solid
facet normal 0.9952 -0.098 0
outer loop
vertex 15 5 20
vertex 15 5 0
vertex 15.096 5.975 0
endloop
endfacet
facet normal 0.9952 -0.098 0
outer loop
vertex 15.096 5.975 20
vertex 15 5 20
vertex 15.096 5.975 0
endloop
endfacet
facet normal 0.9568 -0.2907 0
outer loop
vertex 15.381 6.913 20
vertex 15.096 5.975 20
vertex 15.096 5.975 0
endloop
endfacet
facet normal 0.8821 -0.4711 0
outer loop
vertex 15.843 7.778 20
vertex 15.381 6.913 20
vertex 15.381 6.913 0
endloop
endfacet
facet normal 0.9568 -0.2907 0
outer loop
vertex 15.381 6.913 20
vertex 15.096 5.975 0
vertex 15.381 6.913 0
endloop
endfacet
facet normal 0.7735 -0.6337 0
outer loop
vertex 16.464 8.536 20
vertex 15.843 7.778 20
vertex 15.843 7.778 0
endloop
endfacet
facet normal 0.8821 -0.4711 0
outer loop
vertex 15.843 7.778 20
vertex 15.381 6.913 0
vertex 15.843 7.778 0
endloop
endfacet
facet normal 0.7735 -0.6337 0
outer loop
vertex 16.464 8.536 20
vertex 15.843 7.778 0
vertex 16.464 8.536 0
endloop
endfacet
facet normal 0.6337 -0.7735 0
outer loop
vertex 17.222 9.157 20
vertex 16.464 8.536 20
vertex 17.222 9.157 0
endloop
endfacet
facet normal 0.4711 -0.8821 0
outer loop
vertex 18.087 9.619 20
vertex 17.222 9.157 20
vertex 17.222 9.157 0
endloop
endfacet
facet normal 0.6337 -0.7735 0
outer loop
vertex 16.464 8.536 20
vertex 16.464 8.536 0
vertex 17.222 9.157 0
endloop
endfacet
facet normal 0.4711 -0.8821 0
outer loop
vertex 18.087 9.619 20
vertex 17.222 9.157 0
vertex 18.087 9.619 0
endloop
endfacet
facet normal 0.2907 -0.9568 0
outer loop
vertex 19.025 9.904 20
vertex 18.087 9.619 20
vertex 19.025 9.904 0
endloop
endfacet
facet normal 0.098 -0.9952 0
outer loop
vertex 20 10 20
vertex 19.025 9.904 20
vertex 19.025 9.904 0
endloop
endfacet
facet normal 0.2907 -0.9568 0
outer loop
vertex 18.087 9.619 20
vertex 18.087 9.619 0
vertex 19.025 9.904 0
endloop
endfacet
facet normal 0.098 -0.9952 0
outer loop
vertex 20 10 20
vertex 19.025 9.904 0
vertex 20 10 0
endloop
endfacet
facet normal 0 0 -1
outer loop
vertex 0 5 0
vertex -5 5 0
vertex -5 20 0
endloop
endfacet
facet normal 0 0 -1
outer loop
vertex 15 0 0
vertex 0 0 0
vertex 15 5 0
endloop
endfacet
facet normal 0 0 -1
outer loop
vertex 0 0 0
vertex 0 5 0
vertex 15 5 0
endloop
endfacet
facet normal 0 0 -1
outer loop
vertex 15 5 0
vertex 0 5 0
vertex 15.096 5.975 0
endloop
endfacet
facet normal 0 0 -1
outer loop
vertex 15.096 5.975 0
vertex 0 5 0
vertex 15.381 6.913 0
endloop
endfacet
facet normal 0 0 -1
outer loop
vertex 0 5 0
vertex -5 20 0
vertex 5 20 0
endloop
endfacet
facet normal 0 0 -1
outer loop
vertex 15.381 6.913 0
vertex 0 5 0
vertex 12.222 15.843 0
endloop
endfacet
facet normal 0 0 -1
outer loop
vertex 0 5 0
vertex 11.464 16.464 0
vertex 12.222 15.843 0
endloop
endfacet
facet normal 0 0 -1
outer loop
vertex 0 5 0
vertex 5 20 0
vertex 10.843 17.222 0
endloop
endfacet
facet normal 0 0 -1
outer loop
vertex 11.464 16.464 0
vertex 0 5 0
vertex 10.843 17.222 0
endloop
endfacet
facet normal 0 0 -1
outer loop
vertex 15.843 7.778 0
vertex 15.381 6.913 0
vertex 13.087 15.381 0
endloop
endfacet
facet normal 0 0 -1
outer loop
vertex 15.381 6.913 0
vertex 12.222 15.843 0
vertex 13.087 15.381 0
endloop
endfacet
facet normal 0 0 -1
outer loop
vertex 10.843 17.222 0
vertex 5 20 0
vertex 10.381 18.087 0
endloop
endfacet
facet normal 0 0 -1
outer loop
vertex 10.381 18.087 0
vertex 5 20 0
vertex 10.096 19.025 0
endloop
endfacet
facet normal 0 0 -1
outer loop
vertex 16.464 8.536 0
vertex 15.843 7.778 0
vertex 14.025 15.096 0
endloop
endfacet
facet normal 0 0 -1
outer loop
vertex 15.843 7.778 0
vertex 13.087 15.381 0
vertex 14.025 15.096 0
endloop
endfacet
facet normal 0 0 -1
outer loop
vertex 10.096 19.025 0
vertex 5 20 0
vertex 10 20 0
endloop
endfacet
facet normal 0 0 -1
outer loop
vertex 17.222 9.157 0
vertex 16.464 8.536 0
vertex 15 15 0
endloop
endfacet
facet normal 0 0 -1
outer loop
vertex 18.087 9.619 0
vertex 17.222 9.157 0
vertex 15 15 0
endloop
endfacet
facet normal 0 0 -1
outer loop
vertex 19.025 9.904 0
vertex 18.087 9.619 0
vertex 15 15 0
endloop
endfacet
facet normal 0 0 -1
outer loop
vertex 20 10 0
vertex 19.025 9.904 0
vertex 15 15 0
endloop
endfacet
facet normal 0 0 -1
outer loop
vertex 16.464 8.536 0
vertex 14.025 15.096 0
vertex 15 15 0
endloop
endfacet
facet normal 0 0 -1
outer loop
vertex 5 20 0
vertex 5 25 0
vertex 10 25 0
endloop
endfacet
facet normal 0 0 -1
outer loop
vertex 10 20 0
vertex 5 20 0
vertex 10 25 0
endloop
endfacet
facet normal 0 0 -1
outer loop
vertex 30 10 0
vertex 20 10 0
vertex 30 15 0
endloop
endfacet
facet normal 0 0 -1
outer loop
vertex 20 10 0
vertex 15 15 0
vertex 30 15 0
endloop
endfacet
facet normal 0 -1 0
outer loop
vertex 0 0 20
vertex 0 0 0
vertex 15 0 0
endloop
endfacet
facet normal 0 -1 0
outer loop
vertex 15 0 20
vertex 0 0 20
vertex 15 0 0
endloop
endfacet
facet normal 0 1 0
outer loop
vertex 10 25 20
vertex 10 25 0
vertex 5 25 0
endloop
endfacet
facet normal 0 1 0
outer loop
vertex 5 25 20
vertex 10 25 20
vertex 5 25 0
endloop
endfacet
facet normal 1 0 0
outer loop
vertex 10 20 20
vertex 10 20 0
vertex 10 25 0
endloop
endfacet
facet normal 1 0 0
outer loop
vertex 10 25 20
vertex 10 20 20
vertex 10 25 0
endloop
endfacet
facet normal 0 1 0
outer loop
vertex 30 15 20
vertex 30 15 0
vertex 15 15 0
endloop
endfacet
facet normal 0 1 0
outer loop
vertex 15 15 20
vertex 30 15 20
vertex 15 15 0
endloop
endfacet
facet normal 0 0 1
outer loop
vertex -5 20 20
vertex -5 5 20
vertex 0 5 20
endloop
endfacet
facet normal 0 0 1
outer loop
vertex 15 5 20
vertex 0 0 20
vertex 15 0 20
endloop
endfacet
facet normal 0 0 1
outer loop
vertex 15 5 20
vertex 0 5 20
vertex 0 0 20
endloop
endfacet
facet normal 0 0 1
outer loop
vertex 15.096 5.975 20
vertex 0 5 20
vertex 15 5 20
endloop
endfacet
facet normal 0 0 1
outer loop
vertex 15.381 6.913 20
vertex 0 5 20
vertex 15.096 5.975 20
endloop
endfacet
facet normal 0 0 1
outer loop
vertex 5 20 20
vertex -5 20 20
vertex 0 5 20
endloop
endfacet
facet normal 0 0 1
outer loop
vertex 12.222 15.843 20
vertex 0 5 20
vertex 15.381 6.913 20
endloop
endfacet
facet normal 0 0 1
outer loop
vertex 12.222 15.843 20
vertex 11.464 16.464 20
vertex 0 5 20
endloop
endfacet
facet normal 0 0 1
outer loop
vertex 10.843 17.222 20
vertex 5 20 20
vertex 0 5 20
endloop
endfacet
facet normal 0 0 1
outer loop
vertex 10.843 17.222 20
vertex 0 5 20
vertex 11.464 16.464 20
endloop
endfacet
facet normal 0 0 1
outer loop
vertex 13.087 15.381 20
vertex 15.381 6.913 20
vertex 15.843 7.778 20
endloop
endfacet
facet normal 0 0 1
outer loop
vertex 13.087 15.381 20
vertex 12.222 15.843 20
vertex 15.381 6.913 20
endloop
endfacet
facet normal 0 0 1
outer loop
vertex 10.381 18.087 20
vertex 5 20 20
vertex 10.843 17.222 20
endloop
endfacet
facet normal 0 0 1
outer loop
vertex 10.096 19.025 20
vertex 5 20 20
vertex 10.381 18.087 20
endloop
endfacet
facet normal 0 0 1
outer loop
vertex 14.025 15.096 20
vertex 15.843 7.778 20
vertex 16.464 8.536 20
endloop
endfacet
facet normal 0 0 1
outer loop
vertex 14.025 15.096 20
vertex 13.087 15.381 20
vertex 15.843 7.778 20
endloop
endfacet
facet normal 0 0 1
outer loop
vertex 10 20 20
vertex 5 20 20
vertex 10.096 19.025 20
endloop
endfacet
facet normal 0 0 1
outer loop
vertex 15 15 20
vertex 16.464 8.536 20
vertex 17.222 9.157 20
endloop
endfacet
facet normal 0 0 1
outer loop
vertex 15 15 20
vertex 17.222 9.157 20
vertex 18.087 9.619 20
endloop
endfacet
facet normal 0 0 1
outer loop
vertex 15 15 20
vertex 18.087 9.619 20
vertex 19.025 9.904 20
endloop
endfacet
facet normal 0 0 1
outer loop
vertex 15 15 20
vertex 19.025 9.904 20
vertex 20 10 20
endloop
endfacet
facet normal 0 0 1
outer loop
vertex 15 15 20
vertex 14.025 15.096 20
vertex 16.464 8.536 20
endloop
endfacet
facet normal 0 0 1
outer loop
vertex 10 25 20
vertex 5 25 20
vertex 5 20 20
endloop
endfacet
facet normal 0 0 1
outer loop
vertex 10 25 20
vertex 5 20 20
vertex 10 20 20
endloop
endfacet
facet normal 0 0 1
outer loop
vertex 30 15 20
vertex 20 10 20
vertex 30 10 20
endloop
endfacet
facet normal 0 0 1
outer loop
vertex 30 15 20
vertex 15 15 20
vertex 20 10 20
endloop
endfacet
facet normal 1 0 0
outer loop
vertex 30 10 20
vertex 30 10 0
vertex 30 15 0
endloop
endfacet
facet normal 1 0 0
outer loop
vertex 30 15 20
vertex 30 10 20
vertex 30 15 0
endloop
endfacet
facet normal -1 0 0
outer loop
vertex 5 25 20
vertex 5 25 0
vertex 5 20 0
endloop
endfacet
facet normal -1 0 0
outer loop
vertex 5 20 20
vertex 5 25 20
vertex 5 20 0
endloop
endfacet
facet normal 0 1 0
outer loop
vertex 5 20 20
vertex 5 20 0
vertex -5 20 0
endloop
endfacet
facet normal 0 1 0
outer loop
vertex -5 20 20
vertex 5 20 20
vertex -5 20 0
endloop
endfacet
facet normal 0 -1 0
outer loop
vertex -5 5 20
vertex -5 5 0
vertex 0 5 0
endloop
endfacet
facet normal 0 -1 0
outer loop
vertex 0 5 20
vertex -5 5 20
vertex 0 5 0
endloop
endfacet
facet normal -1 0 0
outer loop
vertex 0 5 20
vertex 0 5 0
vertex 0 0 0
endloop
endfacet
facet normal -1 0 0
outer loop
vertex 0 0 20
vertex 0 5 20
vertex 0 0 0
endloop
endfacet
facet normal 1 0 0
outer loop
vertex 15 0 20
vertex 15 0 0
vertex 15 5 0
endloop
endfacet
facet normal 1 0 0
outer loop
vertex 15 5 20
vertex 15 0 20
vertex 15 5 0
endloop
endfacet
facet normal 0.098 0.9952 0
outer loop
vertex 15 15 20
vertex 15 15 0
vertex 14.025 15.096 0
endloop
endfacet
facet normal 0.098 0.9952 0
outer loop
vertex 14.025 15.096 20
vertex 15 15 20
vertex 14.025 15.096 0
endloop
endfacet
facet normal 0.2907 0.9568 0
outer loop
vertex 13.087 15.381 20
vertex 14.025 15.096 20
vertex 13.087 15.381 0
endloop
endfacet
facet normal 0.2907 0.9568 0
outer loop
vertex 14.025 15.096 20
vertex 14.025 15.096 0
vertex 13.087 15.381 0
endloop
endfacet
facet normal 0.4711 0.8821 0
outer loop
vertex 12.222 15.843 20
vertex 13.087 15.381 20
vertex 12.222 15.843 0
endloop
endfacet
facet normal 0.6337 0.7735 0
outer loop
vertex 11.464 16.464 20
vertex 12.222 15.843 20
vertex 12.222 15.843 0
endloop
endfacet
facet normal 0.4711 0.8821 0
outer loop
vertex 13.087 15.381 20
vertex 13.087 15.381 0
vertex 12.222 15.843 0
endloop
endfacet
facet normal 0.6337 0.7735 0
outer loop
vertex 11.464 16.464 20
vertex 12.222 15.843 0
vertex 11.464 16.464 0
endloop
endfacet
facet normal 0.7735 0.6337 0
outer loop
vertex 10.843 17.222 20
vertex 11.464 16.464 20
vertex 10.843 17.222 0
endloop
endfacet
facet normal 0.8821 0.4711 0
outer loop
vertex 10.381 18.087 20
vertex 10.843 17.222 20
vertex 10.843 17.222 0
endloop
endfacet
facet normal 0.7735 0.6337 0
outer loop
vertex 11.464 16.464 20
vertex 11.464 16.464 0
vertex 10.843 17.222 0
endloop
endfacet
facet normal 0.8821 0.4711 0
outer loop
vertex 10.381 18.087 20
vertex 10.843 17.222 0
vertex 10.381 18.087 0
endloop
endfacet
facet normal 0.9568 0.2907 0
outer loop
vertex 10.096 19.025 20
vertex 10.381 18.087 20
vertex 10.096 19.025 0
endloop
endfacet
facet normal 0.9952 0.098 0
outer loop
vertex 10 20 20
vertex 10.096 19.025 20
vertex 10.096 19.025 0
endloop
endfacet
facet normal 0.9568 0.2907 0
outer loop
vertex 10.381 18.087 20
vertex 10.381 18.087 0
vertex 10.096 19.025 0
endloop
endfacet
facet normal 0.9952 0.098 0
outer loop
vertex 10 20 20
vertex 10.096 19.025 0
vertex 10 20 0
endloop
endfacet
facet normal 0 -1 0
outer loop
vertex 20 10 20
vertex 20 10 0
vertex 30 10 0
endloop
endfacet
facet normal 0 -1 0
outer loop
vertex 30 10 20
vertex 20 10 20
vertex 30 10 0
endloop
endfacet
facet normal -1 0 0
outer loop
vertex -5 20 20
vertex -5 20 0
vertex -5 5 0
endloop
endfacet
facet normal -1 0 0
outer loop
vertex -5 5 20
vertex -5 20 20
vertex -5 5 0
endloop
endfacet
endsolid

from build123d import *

# Parameters (mm, degrees)
EXTRUDE_1_DEPTH = 20


with BuildPart() as part:
    # 草圖1 → 填料-伸長1 (new body)
    with BuildSketch(Plane.XY):
        with BuildLine():
            Line((0, 0), (15, 0))
            Line((15, 0), (15, 5))
            ThreePointArc((15, 5), (16.464466094, 8.535533906), (20, 10))
            Line((20, 10), (30, 10))
            Line((30, 10), (30, 15))
            Line((30, 15), (15, 15))
            ThreePointArc((15, 15), (11.464466094, 16.464466094), (10, 20))
            Line((10, 20), (10, 25))
            Line((10, 25), (5, 25))
            Line((5, 25), (5, 20))
            Line((5, 20), (-5, 20))
            Line((-5, 20), (-5, 5))
            Line((-5, 5), (0, 5))
            Line((0, 5), (0, 0))
        make_face()
    extrude(amount=EXTRUDE_1_DEPTH)


solid = part.part
